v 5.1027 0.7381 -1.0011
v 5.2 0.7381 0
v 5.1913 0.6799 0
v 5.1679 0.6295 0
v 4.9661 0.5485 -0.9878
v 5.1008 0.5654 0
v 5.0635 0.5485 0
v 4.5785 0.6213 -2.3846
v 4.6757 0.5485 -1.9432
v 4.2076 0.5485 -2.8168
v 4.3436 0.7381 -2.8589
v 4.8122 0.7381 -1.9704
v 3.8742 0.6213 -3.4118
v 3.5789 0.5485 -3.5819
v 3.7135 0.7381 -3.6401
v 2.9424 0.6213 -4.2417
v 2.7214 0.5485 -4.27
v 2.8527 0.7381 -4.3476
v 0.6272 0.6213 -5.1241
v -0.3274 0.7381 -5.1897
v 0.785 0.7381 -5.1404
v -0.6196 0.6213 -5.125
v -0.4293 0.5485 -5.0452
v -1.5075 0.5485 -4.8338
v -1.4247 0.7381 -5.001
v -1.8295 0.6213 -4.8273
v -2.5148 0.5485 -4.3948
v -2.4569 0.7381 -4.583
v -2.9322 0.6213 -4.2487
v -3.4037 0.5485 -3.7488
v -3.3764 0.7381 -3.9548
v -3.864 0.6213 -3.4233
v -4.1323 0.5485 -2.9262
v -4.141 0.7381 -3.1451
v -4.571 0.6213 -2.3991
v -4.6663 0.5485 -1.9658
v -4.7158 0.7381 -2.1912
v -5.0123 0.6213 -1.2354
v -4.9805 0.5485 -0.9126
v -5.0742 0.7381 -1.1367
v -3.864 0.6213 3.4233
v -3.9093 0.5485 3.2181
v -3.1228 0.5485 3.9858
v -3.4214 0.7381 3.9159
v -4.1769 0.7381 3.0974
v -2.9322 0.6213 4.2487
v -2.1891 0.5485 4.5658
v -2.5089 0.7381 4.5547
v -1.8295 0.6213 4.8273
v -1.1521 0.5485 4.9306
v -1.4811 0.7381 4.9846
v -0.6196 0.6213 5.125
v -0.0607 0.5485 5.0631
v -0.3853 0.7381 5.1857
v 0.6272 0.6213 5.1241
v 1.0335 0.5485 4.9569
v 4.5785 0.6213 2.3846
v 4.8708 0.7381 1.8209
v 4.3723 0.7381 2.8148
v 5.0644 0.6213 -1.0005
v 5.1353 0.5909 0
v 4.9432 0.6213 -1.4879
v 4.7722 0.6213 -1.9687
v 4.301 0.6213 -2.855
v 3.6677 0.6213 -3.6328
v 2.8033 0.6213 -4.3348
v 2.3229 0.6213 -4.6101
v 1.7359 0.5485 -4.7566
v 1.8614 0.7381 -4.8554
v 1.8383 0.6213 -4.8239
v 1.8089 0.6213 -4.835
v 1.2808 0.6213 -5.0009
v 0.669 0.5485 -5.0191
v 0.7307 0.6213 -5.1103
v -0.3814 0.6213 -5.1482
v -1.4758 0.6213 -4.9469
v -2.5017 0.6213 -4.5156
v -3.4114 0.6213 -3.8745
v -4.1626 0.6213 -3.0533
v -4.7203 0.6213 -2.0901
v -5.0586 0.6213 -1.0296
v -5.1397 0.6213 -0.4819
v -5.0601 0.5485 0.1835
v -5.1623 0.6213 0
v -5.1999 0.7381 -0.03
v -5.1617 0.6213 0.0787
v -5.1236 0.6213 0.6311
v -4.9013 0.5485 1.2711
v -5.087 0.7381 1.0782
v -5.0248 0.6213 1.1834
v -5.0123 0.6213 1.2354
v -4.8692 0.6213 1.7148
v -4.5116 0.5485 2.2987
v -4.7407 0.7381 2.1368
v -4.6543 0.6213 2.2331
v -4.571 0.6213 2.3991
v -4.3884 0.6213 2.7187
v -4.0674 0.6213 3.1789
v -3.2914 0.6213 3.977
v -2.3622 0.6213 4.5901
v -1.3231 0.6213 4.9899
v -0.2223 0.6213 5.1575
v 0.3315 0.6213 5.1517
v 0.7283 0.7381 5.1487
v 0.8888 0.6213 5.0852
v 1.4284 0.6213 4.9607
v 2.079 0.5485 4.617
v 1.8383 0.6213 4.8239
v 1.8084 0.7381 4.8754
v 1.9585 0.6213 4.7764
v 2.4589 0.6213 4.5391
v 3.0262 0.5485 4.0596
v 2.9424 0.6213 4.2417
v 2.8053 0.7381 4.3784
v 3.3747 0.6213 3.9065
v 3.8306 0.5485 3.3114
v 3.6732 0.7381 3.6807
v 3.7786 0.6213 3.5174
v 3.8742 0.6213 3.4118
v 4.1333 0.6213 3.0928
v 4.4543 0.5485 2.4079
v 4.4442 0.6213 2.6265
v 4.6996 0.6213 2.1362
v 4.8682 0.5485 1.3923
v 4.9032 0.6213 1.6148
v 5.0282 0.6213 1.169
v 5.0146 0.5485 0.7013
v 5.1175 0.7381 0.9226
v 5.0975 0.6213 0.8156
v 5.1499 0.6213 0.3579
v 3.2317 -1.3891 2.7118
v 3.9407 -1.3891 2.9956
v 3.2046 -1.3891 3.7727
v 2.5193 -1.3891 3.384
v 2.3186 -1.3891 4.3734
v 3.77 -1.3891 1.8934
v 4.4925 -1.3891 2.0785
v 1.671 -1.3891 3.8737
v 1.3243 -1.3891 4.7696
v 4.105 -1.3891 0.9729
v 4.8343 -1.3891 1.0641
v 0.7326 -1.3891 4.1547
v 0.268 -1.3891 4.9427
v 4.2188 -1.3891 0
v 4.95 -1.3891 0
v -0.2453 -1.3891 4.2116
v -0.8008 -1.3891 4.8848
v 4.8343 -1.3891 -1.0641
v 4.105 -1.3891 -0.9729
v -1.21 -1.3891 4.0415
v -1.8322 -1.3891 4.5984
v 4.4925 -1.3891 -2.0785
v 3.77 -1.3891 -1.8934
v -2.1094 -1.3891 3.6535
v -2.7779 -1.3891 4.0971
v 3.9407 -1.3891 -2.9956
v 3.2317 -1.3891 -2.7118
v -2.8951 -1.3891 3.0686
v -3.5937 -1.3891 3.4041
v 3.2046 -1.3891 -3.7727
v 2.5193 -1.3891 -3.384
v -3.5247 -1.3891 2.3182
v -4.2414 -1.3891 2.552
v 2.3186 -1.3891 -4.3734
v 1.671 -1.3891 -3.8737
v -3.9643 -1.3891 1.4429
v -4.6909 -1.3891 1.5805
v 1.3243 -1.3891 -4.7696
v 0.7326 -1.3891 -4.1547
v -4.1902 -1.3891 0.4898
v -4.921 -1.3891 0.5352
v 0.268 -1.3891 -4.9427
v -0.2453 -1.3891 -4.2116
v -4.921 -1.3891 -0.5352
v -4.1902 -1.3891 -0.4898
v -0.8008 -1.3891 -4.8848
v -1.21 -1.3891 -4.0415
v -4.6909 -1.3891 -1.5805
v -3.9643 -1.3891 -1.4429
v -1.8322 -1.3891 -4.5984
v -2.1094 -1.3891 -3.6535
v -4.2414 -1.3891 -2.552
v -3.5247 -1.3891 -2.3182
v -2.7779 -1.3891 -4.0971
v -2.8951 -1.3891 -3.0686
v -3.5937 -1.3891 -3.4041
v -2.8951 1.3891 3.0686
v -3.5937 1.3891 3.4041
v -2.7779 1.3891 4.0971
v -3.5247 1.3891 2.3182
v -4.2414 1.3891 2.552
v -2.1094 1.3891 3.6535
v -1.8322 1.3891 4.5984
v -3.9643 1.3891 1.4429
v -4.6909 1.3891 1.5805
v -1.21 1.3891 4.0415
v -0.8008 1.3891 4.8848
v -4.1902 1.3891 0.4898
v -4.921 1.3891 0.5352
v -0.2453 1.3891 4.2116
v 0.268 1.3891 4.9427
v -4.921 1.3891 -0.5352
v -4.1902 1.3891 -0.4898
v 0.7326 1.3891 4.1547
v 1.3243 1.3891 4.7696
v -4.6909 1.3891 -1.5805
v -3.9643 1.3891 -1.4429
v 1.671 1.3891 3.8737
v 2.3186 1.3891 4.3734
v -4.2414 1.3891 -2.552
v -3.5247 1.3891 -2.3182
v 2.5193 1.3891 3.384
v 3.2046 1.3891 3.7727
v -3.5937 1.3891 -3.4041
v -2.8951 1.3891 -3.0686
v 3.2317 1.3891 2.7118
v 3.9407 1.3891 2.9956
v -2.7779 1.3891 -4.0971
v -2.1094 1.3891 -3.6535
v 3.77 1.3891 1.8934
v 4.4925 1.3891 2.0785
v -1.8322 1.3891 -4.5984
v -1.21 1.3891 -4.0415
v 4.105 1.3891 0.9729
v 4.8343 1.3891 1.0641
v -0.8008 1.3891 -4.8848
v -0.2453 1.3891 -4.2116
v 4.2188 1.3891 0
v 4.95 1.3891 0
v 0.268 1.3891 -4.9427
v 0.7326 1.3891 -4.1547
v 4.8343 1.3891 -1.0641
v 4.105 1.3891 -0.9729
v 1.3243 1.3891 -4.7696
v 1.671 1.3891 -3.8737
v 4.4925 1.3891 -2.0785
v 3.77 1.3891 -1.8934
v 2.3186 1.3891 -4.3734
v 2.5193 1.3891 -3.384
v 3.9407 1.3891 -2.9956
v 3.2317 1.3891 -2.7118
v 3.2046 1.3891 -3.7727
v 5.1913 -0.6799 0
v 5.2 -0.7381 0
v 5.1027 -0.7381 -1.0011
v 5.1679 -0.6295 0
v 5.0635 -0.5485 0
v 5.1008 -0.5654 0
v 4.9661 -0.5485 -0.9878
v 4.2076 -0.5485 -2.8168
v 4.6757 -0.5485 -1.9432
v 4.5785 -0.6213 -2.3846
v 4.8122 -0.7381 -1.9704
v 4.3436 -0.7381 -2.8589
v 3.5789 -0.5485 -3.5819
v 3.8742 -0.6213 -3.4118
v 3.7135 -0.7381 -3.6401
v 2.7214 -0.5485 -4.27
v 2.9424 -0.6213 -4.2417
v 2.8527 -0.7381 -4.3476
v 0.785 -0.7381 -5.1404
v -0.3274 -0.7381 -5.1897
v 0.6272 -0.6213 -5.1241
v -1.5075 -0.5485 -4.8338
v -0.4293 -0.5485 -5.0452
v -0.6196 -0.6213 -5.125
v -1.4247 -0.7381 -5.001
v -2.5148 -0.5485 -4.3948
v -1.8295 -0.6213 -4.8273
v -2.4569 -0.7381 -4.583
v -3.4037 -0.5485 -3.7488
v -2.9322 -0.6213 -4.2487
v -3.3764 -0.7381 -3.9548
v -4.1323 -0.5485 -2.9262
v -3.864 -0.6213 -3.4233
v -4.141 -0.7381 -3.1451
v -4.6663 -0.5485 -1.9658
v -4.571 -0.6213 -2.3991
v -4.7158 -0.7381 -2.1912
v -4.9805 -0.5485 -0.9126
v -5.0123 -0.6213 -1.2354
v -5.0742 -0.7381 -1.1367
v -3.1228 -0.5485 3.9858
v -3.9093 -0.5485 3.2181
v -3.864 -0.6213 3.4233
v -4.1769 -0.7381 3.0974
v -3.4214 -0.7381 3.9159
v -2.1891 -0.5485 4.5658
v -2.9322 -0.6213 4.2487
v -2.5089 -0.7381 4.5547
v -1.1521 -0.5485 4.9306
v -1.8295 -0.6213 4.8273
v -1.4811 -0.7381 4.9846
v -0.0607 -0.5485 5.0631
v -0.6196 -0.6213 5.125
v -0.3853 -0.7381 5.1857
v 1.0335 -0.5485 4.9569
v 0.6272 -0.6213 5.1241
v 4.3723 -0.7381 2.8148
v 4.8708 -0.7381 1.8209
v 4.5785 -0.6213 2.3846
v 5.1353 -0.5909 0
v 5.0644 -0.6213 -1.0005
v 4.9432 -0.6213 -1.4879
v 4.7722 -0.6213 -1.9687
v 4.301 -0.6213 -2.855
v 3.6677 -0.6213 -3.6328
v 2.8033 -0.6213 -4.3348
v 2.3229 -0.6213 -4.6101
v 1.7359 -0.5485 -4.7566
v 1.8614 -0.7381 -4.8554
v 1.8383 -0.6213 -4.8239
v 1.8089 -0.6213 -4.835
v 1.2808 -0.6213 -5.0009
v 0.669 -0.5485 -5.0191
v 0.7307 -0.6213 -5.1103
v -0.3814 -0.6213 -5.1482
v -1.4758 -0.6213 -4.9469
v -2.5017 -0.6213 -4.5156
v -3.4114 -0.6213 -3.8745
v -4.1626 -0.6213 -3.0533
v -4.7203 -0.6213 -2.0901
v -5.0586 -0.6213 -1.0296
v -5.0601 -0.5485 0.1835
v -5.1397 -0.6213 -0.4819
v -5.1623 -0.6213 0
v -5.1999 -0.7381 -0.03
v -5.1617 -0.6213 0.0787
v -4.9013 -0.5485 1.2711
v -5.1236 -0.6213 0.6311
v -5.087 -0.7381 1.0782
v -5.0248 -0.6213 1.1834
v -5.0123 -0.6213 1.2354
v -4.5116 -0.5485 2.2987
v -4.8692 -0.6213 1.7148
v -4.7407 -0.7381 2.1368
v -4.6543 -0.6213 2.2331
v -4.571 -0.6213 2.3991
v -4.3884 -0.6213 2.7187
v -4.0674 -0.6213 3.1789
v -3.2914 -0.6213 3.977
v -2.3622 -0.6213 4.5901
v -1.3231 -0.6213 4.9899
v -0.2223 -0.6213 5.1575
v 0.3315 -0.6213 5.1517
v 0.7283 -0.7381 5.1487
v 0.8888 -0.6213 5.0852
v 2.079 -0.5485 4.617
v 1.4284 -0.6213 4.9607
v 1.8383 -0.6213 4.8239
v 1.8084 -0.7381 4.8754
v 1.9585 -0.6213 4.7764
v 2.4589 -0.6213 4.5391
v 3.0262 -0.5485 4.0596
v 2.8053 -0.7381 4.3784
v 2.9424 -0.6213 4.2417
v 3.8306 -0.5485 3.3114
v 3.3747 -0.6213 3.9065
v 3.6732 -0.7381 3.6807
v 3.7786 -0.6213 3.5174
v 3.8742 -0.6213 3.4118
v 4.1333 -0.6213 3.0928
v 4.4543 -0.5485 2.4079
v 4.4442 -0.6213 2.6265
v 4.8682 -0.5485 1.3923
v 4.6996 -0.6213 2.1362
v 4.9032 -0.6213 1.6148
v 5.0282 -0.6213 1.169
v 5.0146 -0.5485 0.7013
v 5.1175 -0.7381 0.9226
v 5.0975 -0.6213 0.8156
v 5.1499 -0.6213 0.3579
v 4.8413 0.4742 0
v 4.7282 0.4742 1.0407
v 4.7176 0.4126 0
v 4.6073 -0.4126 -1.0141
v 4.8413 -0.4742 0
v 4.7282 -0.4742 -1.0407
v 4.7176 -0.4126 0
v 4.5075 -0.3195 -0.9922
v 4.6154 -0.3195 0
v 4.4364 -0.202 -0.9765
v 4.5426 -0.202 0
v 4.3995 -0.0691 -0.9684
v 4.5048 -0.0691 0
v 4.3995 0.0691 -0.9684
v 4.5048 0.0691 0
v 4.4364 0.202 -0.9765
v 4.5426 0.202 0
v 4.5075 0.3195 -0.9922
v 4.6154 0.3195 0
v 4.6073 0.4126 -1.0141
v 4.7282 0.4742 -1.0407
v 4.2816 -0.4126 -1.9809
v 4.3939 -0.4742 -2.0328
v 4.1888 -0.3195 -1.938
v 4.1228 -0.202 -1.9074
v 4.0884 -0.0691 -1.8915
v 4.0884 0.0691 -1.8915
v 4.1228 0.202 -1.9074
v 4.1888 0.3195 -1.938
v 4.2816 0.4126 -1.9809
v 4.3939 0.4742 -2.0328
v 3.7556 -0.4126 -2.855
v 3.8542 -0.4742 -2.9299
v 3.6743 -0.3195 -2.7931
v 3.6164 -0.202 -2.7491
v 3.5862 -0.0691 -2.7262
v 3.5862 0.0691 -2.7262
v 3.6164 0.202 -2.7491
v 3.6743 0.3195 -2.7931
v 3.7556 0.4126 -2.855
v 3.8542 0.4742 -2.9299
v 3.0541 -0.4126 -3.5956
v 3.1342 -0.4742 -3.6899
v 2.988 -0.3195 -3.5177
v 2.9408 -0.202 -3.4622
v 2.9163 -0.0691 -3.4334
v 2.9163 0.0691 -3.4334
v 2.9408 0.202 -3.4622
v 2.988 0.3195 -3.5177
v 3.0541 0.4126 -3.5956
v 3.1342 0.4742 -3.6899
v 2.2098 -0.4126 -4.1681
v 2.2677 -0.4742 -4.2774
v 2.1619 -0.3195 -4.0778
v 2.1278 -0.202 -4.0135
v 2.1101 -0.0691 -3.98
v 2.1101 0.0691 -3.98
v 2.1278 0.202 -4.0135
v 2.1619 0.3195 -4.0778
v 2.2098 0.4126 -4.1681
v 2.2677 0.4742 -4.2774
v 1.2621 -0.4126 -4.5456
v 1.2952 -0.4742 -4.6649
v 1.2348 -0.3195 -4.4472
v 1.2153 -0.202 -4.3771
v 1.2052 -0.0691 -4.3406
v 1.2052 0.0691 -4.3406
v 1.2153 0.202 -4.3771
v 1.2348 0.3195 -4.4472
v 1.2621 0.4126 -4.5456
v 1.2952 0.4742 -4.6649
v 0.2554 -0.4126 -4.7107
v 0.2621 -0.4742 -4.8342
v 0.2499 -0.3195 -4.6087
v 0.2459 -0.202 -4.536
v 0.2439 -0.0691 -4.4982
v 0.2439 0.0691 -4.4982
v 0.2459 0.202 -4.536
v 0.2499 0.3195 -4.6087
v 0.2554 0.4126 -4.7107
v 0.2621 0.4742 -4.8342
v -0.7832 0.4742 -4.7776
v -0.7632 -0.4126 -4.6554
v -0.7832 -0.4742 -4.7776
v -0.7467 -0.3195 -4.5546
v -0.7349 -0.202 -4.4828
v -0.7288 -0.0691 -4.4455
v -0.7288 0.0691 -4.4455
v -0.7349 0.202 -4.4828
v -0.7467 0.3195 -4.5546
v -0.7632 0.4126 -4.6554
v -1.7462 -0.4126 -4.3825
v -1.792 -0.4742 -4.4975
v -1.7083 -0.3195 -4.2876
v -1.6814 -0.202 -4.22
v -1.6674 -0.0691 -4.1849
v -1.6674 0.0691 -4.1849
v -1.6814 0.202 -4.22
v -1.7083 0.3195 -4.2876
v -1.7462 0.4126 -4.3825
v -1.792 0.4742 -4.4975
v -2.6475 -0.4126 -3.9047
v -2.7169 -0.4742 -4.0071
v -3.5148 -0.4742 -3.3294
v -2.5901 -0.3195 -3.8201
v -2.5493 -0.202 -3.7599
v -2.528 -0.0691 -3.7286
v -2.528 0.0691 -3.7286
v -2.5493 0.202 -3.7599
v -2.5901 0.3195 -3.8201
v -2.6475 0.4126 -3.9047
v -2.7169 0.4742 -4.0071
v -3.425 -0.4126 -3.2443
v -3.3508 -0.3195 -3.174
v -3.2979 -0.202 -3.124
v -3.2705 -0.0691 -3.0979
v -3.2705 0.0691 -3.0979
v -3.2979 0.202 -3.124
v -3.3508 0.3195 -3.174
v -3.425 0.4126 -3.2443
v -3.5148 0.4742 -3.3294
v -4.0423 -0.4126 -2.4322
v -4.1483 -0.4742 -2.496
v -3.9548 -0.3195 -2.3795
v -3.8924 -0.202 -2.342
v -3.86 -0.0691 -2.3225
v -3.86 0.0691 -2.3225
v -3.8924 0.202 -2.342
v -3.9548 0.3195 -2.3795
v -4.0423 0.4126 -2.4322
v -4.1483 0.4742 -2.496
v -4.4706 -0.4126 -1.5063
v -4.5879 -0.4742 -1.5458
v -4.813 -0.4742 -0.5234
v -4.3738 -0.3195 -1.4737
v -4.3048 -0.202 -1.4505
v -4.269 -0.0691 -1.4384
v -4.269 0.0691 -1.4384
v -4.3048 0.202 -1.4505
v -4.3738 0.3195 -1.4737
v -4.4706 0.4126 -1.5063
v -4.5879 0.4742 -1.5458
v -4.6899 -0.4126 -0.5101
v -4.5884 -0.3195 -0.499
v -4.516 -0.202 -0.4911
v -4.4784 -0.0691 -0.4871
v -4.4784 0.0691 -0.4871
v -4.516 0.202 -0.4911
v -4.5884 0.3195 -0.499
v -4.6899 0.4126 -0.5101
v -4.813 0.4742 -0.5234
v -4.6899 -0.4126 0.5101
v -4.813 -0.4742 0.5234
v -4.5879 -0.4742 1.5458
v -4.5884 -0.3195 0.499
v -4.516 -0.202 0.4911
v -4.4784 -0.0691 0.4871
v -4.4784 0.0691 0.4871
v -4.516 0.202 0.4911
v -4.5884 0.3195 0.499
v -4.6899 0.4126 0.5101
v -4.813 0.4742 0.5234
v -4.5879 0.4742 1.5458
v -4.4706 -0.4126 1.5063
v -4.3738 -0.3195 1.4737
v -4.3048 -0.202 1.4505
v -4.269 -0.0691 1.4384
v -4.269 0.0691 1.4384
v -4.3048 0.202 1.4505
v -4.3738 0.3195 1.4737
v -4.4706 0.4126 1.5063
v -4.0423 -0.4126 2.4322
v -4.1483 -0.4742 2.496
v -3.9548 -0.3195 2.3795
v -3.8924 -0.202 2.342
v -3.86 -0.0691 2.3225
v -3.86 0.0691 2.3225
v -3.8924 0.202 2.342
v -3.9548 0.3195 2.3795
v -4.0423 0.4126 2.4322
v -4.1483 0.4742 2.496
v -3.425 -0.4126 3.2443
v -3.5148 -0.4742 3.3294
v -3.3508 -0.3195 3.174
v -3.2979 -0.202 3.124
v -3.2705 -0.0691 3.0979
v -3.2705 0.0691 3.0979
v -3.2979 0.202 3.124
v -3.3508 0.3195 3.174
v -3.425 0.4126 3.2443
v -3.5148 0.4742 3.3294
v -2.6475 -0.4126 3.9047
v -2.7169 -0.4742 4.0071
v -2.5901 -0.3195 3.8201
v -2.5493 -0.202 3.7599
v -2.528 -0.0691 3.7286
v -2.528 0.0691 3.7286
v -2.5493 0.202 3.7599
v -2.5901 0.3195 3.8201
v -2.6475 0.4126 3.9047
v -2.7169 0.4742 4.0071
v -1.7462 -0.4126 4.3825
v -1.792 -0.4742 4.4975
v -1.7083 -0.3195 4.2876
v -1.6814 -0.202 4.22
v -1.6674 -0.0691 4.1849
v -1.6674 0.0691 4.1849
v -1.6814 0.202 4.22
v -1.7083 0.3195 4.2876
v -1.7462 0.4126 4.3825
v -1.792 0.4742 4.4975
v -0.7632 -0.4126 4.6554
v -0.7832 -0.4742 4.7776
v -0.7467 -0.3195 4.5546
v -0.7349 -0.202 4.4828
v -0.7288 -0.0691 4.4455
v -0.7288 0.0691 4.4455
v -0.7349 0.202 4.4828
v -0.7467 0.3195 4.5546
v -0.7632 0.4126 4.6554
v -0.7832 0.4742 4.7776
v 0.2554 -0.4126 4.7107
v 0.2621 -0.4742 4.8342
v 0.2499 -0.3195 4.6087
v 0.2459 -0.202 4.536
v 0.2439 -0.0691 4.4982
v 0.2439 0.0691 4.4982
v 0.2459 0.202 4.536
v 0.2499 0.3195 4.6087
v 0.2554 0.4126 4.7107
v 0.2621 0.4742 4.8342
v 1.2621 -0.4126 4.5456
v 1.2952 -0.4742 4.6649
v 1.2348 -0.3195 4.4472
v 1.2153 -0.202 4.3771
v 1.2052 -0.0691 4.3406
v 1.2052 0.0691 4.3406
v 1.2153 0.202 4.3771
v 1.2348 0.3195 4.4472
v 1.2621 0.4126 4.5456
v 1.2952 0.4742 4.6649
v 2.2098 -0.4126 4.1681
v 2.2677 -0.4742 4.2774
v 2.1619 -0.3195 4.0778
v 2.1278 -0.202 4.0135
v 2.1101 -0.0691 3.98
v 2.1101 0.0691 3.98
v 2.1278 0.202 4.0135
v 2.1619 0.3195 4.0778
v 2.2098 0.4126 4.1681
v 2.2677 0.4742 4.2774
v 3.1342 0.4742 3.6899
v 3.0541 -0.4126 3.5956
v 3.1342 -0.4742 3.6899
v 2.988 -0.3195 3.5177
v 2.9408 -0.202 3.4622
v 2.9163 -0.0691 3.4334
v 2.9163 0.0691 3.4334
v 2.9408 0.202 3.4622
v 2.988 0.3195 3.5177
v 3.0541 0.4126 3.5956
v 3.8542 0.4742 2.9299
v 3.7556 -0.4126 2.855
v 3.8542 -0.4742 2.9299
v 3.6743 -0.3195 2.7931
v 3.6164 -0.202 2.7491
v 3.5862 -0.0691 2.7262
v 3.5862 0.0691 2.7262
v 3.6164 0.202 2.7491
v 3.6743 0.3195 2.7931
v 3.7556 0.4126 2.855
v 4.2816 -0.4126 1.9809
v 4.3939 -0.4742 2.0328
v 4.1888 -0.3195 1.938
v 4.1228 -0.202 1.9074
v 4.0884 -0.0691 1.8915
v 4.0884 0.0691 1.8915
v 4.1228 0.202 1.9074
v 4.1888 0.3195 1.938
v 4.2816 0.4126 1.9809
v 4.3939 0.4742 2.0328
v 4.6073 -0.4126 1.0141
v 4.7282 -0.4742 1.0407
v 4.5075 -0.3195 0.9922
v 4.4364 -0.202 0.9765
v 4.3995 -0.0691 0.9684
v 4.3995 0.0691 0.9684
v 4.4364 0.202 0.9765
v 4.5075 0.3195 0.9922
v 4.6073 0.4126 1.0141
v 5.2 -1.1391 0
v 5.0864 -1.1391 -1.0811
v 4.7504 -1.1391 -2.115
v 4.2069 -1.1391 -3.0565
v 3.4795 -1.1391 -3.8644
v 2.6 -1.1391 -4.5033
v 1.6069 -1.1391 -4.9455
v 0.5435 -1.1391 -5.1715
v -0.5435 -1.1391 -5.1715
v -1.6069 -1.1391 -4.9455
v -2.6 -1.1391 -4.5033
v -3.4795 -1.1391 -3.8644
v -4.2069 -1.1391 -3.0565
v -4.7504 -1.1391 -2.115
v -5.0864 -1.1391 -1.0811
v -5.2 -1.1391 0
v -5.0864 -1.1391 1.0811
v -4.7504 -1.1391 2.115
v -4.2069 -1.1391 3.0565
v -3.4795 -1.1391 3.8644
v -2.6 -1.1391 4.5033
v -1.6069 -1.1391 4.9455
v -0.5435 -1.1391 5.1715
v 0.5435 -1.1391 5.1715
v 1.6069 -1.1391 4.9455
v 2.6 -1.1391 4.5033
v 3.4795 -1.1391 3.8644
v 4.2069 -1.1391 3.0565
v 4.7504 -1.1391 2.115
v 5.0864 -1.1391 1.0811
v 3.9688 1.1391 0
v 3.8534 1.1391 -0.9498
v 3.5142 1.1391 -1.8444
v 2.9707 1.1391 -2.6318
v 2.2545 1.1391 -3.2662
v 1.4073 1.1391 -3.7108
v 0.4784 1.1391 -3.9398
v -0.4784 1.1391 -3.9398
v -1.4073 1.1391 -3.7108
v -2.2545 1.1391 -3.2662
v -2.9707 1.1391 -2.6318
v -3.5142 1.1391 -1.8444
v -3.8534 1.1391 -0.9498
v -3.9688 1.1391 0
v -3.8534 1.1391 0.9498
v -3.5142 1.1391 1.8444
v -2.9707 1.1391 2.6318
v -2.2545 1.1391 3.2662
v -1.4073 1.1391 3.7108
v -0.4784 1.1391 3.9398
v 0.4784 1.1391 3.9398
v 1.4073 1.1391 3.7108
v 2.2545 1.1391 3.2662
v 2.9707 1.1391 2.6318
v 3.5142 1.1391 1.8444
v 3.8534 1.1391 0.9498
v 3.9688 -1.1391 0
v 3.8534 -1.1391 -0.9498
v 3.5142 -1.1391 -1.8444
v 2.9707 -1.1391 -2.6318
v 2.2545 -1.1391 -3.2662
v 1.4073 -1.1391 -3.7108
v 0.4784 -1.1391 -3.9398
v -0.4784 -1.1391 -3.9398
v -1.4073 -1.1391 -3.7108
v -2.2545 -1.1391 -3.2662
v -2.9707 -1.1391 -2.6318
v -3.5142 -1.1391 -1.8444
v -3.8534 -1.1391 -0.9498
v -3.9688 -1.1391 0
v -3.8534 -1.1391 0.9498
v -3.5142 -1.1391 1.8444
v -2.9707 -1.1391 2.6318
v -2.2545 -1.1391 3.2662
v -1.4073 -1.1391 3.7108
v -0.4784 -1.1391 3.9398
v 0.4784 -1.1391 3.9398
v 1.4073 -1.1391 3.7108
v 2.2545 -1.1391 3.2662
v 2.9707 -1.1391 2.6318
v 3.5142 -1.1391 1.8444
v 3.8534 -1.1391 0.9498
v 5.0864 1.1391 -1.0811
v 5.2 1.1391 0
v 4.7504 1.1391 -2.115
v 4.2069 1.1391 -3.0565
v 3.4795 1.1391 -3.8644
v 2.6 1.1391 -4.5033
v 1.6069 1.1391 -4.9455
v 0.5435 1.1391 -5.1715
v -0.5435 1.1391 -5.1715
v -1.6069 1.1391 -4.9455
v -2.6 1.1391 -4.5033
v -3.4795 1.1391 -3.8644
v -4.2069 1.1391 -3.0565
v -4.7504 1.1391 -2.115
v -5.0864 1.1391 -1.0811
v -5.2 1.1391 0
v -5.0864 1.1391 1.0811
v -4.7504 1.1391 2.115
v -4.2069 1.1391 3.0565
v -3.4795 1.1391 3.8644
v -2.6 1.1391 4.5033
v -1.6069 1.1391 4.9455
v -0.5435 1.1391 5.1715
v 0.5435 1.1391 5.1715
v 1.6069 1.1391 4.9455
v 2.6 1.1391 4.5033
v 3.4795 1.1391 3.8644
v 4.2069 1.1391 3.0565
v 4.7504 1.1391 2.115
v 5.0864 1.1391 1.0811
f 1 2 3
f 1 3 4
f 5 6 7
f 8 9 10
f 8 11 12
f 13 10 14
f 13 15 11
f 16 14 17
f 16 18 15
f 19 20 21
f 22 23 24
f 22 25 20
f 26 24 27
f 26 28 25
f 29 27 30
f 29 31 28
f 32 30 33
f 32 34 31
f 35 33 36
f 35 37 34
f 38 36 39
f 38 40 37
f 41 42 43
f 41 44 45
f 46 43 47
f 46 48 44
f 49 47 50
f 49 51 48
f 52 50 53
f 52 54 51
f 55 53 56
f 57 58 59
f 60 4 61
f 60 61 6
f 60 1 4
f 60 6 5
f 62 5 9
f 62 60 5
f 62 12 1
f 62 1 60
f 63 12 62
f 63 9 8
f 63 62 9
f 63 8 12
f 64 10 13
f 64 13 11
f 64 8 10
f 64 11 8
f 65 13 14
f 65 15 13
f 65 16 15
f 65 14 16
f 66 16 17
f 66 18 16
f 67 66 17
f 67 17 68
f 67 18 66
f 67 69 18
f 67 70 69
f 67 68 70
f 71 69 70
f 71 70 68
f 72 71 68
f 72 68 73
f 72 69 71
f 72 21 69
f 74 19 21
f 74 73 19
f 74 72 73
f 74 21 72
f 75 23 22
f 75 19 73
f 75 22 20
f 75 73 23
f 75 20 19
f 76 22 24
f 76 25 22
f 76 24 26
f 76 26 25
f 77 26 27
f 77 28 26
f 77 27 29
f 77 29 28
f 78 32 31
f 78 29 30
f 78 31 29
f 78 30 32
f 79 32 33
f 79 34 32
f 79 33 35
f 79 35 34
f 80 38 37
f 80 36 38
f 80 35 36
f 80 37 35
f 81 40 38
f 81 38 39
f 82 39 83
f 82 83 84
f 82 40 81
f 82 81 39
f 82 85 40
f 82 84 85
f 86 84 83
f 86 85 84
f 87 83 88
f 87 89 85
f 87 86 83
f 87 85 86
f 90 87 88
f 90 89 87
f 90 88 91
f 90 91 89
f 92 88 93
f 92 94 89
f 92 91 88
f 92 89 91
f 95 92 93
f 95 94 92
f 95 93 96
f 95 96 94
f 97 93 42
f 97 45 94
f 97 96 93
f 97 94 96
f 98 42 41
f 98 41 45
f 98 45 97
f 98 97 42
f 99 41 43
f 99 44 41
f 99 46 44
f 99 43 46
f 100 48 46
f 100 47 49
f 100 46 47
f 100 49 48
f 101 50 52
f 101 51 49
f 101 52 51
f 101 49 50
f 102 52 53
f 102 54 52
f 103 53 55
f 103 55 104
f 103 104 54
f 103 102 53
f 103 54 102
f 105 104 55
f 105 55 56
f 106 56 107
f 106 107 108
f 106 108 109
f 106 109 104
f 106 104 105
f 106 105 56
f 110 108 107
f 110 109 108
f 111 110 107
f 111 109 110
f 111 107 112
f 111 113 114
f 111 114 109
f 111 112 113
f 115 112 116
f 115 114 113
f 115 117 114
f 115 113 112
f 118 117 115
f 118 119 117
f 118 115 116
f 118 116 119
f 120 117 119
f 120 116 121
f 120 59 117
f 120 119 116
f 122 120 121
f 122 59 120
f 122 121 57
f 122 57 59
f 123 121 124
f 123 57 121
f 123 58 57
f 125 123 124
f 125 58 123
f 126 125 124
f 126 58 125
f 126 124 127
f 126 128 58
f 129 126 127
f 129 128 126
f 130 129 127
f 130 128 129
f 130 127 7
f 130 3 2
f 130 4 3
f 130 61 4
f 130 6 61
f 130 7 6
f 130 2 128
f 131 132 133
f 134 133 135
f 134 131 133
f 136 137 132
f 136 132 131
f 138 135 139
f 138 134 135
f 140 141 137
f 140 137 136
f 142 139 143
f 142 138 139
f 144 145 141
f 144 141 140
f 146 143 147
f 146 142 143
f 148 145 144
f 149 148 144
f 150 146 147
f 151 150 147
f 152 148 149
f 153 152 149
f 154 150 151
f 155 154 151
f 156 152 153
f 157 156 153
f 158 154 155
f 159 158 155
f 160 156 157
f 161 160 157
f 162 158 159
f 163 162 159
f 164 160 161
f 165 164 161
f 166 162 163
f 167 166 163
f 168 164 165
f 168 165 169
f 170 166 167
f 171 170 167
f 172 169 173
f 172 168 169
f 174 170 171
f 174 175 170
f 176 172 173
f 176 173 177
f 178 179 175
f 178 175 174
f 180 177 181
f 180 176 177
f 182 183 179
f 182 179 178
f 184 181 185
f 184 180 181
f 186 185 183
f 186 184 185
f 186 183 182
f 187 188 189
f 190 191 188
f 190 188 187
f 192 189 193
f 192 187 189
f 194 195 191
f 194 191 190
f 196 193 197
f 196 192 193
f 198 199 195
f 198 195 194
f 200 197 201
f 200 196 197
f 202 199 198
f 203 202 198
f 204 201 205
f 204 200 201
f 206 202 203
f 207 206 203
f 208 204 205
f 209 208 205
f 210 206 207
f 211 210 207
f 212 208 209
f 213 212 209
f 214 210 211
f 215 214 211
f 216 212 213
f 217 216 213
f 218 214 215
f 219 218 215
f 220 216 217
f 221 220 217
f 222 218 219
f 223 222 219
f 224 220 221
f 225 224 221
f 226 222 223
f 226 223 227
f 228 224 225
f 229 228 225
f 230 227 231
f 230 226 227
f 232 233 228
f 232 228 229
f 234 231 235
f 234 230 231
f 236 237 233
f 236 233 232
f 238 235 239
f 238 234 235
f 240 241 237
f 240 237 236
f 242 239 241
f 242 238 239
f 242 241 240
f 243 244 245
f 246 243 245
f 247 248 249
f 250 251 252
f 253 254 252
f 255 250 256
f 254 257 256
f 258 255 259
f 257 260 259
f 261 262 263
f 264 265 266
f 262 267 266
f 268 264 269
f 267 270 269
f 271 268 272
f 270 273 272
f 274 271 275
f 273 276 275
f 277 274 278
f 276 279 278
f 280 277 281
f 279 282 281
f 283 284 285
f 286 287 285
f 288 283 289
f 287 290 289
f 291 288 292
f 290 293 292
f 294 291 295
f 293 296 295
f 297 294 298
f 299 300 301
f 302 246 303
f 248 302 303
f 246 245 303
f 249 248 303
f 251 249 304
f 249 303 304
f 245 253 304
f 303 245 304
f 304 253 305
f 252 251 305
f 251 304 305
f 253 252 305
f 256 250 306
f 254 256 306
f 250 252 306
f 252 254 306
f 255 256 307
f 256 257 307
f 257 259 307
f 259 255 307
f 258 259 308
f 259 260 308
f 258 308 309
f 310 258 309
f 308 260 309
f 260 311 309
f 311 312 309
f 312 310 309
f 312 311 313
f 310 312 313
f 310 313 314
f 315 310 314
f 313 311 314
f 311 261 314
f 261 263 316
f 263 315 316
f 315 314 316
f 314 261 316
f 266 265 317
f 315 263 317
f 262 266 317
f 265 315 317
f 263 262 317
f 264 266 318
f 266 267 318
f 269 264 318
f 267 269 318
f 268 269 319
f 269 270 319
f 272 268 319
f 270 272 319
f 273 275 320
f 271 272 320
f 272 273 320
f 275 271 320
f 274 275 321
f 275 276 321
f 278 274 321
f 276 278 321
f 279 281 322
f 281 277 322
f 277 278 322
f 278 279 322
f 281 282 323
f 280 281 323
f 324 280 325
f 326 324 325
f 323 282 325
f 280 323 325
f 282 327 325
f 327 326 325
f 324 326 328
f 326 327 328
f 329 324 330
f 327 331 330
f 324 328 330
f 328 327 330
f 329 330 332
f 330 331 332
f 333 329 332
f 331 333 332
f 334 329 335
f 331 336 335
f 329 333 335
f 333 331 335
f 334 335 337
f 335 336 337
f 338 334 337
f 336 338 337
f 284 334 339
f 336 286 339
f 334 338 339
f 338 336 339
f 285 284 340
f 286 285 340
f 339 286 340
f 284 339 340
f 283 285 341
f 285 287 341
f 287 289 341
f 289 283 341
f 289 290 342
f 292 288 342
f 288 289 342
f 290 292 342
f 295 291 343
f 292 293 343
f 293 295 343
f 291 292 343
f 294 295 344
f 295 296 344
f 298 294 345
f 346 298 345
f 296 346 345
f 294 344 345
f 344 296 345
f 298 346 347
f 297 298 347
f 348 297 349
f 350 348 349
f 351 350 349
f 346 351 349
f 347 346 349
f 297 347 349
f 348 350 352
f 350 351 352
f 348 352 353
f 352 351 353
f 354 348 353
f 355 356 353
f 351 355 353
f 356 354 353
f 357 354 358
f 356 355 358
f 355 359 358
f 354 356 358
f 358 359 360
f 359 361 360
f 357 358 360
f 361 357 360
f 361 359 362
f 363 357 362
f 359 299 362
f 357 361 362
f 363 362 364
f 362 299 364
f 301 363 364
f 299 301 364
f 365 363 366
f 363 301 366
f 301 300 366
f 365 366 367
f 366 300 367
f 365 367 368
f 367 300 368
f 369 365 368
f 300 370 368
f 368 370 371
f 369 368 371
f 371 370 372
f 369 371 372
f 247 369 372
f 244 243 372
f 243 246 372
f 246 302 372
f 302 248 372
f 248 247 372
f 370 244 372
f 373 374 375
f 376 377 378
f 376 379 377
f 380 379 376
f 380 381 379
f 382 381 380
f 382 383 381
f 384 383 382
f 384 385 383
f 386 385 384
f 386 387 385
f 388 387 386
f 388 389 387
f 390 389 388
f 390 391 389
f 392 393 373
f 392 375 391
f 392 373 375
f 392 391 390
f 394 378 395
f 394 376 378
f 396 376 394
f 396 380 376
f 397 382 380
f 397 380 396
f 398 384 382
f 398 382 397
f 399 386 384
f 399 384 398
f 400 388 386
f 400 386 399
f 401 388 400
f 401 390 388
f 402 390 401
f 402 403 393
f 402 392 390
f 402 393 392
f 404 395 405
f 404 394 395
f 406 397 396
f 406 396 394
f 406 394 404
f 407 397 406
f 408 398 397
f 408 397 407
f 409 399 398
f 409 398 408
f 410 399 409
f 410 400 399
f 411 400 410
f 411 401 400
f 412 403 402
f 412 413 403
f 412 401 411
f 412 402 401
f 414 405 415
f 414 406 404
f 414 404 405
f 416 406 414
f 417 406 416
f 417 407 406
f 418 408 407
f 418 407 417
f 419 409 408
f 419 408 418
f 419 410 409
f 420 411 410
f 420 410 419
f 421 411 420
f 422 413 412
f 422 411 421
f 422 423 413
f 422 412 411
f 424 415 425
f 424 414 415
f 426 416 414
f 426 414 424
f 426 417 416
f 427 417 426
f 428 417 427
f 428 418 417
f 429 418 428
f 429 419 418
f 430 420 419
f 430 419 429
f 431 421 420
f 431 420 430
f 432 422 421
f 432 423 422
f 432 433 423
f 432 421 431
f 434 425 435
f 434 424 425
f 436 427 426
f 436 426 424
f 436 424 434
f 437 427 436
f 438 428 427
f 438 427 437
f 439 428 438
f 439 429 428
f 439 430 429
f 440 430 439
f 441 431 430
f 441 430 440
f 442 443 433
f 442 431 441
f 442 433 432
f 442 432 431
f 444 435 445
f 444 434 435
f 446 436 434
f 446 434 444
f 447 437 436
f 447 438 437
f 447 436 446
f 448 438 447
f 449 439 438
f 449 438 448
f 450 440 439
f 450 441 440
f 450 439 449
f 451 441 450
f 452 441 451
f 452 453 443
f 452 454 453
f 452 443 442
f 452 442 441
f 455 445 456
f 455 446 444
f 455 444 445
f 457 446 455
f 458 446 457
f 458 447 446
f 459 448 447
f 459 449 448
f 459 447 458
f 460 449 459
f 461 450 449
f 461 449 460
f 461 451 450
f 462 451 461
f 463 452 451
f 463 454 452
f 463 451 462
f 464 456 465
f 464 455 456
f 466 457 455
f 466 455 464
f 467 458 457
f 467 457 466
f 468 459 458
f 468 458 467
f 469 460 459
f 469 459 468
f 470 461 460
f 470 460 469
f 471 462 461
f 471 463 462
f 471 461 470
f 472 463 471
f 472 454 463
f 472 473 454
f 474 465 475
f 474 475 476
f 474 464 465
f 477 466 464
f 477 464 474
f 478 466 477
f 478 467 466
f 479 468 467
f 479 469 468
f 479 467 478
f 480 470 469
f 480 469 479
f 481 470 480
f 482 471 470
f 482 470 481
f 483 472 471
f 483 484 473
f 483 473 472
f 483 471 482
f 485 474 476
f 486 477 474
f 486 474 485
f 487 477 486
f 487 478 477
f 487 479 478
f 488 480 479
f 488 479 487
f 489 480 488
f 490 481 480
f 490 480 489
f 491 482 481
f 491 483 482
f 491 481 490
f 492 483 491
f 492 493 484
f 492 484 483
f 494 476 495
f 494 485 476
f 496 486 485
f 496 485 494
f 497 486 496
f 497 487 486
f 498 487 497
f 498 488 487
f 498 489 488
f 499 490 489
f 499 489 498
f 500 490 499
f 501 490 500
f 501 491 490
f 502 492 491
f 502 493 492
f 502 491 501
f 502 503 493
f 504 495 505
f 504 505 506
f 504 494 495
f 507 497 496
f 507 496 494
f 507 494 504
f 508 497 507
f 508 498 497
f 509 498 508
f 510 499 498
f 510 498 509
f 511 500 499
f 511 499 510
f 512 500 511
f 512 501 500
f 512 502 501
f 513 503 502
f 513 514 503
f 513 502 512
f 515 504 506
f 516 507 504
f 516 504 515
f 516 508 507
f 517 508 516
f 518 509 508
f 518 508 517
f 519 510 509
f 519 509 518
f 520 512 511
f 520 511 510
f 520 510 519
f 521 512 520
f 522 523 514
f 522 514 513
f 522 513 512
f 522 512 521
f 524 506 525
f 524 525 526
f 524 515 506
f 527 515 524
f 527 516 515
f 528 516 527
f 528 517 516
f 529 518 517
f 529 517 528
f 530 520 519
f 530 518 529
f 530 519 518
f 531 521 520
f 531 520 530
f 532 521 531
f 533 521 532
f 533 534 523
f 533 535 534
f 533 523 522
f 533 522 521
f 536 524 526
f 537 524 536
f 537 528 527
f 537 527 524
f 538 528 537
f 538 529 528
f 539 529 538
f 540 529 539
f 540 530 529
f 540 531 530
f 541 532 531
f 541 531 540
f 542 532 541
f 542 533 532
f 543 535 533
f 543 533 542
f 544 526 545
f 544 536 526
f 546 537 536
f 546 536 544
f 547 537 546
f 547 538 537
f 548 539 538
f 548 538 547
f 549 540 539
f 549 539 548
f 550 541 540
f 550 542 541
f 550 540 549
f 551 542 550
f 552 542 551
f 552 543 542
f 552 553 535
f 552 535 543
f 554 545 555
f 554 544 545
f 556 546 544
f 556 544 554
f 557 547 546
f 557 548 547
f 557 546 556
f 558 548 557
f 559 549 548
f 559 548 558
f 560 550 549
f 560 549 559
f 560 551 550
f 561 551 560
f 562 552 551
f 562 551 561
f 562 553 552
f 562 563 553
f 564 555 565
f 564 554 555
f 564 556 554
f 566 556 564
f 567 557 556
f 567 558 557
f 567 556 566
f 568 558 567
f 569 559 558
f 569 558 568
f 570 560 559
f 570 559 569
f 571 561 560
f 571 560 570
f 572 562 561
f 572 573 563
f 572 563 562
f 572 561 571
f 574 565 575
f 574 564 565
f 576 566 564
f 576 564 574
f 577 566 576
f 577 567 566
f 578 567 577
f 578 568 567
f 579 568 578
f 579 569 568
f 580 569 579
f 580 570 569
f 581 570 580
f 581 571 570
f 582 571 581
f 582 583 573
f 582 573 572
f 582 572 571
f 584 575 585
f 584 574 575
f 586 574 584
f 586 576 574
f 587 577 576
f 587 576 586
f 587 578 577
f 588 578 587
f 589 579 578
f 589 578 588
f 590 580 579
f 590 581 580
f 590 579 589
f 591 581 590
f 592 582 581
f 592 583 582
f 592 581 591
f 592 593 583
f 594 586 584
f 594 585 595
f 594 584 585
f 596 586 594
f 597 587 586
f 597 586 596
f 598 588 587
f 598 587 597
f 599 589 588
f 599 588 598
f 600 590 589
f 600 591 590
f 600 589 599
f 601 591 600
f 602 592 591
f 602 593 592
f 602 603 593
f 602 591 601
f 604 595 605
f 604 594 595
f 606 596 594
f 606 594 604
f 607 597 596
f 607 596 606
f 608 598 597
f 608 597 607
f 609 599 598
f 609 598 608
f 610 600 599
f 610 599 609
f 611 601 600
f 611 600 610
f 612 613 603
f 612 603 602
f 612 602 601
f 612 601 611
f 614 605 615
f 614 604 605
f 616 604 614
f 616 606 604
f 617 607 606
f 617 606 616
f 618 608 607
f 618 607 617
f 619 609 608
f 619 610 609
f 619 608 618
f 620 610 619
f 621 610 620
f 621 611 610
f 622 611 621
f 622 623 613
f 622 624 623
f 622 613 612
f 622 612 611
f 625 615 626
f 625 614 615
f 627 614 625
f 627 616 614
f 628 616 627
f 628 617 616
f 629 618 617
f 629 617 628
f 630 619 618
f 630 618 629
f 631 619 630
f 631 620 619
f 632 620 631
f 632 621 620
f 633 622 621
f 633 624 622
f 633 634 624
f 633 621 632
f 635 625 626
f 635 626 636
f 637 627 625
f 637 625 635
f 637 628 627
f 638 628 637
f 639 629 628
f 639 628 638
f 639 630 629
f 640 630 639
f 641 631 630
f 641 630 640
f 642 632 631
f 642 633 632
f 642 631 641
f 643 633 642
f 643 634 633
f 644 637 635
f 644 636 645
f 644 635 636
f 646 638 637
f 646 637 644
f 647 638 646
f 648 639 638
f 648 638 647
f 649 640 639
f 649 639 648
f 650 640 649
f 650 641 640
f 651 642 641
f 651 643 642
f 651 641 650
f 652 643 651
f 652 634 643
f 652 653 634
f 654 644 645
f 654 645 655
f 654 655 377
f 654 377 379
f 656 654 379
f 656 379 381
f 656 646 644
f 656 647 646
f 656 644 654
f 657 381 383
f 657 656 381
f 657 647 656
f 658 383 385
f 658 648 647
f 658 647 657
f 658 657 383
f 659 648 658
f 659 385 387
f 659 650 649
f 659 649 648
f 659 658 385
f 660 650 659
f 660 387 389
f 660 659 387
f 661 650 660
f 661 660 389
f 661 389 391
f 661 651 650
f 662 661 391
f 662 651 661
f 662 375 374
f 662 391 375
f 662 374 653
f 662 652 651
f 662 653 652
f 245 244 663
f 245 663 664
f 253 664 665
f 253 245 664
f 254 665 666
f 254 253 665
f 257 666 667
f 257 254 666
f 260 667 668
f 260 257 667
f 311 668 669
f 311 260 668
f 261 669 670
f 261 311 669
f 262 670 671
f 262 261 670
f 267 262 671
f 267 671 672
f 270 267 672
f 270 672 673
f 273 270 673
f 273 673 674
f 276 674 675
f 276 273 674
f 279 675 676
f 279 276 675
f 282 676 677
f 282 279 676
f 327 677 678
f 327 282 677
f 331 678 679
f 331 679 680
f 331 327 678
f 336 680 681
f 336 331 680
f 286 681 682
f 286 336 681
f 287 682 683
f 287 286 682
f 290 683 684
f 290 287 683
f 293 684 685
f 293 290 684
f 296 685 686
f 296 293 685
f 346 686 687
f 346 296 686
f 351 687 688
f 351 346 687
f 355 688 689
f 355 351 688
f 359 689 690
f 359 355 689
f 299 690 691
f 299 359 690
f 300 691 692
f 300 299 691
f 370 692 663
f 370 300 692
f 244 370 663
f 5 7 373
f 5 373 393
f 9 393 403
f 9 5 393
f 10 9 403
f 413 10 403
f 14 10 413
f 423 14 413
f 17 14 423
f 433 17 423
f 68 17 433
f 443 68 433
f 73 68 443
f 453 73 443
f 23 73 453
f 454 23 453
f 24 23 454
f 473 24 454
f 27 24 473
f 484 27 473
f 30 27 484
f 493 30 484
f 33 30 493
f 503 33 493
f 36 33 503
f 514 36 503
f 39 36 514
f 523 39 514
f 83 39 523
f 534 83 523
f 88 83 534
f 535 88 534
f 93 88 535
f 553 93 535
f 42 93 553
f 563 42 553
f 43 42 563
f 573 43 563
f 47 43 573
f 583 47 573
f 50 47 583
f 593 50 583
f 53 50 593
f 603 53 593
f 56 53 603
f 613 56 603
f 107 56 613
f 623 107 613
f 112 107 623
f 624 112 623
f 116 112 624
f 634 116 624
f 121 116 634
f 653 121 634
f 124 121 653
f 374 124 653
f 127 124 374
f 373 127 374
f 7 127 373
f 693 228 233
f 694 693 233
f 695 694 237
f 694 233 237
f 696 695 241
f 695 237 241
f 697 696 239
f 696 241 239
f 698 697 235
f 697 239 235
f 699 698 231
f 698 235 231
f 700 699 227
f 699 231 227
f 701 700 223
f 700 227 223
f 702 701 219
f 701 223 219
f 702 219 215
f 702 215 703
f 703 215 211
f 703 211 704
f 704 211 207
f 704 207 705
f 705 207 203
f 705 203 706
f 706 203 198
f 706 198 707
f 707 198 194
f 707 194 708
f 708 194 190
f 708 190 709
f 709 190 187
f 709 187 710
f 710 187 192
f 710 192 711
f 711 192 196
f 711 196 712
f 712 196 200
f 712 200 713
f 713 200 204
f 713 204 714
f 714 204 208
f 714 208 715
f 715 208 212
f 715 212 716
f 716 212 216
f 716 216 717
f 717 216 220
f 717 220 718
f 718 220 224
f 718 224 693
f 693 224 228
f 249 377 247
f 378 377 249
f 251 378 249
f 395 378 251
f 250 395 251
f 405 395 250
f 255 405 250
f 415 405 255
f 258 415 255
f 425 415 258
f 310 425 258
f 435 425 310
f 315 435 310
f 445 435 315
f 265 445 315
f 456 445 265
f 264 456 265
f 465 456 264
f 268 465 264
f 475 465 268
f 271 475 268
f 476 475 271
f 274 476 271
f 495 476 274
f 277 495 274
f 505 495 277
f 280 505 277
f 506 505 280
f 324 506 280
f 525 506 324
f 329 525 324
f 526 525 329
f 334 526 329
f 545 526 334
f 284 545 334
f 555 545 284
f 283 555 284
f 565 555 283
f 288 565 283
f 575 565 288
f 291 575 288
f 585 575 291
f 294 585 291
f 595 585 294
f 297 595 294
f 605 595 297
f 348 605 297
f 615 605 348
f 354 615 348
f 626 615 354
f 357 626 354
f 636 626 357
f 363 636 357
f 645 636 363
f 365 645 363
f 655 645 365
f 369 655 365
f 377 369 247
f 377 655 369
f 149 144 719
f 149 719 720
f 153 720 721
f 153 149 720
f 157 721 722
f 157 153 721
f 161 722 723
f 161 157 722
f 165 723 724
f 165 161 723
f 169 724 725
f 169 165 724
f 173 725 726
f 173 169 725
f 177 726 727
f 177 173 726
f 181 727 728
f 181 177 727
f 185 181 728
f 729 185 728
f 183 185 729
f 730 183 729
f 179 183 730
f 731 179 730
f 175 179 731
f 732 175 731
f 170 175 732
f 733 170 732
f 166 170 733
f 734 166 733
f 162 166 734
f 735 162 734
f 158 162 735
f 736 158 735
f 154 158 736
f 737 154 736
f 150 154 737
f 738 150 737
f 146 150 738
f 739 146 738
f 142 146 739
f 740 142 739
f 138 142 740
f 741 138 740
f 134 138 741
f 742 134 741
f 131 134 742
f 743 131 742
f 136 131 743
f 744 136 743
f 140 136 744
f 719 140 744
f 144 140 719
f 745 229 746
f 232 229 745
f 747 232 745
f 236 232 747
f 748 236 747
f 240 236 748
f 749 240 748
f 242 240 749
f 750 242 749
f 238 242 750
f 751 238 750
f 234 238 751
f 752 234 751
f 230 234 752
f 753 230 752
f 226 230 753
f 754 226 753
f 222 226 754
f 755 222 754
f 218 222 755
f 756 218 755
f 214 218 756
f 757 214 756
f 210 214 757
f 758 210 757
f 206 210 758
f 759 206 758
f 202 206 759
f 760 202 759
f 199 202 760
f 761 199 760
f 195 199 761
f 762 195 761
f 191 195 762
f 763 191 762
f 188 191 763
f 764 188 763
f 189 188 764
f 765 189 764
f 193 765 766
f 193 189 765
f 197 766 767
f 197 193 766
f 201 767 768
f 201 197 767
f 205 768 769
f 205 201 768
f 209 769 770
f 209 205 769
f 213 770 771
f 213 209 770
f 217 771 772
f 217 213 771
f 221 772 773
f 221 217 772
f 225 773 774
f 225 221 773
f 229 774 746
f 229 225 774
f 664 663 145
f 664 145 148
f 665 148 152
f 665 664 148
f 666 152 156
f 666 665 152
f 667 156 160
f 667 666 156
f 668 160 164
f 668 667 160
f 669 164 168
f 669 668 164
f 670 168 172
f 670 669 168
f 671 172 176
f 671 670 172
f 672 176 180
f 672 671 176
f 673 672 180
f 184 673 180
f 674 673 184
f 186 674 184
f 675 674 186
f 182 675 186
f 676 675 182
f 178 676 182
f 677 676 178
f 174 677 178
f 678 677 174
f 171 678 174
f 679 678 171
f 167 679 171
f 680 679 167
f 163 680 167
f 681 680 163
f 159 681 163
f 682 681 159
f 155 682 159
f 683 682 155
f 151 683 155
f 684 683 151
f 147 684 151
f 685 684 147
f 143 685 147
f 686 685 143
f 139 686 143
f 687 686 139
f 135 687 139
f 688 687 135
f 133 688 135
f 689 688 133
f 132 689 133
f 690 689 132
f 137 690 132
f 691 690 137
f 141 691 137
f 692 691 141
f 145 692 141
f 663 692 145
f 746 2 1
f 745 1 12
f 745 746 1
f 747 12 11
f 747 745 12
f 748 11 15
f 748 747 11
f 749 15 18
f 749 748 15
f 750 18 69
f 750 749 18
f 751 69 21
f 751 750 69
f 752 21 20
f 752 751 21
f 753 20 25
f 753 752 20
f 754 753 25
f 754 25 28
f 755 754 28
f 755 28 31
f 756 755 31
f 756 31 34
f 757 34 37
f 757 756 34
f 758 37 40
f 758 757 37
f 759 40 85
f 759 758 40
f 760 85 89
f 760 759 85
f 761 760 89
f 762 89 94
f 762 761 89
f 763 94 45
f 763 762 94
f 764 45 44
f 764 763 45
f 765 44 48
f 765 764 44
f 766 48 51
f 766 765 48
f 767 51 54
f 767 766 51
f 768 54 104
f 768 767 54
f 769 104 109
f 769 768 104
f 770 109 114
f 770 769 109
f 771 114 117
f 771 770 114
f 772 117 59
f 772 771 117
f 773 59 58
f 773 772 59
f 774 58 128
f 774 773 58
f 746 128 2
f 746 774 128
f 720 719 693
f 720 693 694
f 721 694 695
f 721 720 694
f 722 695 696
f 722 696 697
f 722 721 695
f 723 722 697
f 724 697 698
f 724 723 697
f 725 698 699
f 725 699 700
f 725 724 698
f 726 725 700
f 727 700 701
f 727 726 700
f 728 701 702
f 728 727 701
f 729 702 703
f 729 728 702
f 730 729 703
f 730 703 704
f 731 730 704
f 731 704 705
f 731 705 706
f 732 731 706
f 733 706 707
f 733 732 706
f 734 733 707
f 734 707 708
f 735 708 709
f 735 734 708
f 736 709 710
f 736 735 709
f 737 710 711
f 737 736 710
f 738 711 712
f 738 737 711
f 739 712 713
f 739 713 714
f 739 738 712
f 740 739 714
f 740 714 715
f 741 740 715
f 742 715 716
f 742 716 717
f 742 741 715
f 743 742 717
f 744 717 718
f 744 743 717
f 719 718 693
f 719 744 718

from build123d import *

# Parameters (mm, degrees)
CHAMFER1_SIZE = 0.25
FILLET1_R     = 0.2


with BuildPart() as part:
    # Sketch1 → Revolve1 (revolve)
    with BuildSketch(Plane.XY):
        with BuildLine():
            Line((3.96875, 1.3890625), (3.96875, -1.3890625))
            Line((3.96875, -1.3890625), (5.2, -1.3890625))
            Line((5.2, -1.3890625), (5.2, -0.594165218))
            Line((5.2, -0.594165218), (4.841347672, -0.474161828))
            ThreePointArc((4.841347672, -0.474161828), (4.5, 0), (4.841347672, 0.474161828))
            Line((4.841347672, 0.474161828), (5.2, 0.594165218))
            Line((5.2, 0.594165218), (5.2, 1.3890625))
            Line((5.2, 1.3890625), (3.96875, 1.3890625))
        make_face()
    revolve(axis=Axis((0, 0, 0), (0, 1, 0)))

    # Chamfer1
    chamfer1_edges = [part.edges().sort_by_distance(p)[0] for p in [
        (-3.96875, 1.3890625, 0),
        (-5.2, 1.3890625, 0),
        (-5.2, -1.3890625, 0),
        (-3.96875, -1.3890625, 0),
    ]]
    chamfer(chamfer1_edges, length=CHAMFER1_SIZE)

    # Fillet1
    fillet1_edges = [part.edges().sort_by_distance(p)[0] for p in [
        (-5.2, 0.594165218, 0),
        (-5.2, -0.594165218, 0),
    ]]
    fillet(fillet1_edges, radius=FILLET1_R)


solid = part.part
